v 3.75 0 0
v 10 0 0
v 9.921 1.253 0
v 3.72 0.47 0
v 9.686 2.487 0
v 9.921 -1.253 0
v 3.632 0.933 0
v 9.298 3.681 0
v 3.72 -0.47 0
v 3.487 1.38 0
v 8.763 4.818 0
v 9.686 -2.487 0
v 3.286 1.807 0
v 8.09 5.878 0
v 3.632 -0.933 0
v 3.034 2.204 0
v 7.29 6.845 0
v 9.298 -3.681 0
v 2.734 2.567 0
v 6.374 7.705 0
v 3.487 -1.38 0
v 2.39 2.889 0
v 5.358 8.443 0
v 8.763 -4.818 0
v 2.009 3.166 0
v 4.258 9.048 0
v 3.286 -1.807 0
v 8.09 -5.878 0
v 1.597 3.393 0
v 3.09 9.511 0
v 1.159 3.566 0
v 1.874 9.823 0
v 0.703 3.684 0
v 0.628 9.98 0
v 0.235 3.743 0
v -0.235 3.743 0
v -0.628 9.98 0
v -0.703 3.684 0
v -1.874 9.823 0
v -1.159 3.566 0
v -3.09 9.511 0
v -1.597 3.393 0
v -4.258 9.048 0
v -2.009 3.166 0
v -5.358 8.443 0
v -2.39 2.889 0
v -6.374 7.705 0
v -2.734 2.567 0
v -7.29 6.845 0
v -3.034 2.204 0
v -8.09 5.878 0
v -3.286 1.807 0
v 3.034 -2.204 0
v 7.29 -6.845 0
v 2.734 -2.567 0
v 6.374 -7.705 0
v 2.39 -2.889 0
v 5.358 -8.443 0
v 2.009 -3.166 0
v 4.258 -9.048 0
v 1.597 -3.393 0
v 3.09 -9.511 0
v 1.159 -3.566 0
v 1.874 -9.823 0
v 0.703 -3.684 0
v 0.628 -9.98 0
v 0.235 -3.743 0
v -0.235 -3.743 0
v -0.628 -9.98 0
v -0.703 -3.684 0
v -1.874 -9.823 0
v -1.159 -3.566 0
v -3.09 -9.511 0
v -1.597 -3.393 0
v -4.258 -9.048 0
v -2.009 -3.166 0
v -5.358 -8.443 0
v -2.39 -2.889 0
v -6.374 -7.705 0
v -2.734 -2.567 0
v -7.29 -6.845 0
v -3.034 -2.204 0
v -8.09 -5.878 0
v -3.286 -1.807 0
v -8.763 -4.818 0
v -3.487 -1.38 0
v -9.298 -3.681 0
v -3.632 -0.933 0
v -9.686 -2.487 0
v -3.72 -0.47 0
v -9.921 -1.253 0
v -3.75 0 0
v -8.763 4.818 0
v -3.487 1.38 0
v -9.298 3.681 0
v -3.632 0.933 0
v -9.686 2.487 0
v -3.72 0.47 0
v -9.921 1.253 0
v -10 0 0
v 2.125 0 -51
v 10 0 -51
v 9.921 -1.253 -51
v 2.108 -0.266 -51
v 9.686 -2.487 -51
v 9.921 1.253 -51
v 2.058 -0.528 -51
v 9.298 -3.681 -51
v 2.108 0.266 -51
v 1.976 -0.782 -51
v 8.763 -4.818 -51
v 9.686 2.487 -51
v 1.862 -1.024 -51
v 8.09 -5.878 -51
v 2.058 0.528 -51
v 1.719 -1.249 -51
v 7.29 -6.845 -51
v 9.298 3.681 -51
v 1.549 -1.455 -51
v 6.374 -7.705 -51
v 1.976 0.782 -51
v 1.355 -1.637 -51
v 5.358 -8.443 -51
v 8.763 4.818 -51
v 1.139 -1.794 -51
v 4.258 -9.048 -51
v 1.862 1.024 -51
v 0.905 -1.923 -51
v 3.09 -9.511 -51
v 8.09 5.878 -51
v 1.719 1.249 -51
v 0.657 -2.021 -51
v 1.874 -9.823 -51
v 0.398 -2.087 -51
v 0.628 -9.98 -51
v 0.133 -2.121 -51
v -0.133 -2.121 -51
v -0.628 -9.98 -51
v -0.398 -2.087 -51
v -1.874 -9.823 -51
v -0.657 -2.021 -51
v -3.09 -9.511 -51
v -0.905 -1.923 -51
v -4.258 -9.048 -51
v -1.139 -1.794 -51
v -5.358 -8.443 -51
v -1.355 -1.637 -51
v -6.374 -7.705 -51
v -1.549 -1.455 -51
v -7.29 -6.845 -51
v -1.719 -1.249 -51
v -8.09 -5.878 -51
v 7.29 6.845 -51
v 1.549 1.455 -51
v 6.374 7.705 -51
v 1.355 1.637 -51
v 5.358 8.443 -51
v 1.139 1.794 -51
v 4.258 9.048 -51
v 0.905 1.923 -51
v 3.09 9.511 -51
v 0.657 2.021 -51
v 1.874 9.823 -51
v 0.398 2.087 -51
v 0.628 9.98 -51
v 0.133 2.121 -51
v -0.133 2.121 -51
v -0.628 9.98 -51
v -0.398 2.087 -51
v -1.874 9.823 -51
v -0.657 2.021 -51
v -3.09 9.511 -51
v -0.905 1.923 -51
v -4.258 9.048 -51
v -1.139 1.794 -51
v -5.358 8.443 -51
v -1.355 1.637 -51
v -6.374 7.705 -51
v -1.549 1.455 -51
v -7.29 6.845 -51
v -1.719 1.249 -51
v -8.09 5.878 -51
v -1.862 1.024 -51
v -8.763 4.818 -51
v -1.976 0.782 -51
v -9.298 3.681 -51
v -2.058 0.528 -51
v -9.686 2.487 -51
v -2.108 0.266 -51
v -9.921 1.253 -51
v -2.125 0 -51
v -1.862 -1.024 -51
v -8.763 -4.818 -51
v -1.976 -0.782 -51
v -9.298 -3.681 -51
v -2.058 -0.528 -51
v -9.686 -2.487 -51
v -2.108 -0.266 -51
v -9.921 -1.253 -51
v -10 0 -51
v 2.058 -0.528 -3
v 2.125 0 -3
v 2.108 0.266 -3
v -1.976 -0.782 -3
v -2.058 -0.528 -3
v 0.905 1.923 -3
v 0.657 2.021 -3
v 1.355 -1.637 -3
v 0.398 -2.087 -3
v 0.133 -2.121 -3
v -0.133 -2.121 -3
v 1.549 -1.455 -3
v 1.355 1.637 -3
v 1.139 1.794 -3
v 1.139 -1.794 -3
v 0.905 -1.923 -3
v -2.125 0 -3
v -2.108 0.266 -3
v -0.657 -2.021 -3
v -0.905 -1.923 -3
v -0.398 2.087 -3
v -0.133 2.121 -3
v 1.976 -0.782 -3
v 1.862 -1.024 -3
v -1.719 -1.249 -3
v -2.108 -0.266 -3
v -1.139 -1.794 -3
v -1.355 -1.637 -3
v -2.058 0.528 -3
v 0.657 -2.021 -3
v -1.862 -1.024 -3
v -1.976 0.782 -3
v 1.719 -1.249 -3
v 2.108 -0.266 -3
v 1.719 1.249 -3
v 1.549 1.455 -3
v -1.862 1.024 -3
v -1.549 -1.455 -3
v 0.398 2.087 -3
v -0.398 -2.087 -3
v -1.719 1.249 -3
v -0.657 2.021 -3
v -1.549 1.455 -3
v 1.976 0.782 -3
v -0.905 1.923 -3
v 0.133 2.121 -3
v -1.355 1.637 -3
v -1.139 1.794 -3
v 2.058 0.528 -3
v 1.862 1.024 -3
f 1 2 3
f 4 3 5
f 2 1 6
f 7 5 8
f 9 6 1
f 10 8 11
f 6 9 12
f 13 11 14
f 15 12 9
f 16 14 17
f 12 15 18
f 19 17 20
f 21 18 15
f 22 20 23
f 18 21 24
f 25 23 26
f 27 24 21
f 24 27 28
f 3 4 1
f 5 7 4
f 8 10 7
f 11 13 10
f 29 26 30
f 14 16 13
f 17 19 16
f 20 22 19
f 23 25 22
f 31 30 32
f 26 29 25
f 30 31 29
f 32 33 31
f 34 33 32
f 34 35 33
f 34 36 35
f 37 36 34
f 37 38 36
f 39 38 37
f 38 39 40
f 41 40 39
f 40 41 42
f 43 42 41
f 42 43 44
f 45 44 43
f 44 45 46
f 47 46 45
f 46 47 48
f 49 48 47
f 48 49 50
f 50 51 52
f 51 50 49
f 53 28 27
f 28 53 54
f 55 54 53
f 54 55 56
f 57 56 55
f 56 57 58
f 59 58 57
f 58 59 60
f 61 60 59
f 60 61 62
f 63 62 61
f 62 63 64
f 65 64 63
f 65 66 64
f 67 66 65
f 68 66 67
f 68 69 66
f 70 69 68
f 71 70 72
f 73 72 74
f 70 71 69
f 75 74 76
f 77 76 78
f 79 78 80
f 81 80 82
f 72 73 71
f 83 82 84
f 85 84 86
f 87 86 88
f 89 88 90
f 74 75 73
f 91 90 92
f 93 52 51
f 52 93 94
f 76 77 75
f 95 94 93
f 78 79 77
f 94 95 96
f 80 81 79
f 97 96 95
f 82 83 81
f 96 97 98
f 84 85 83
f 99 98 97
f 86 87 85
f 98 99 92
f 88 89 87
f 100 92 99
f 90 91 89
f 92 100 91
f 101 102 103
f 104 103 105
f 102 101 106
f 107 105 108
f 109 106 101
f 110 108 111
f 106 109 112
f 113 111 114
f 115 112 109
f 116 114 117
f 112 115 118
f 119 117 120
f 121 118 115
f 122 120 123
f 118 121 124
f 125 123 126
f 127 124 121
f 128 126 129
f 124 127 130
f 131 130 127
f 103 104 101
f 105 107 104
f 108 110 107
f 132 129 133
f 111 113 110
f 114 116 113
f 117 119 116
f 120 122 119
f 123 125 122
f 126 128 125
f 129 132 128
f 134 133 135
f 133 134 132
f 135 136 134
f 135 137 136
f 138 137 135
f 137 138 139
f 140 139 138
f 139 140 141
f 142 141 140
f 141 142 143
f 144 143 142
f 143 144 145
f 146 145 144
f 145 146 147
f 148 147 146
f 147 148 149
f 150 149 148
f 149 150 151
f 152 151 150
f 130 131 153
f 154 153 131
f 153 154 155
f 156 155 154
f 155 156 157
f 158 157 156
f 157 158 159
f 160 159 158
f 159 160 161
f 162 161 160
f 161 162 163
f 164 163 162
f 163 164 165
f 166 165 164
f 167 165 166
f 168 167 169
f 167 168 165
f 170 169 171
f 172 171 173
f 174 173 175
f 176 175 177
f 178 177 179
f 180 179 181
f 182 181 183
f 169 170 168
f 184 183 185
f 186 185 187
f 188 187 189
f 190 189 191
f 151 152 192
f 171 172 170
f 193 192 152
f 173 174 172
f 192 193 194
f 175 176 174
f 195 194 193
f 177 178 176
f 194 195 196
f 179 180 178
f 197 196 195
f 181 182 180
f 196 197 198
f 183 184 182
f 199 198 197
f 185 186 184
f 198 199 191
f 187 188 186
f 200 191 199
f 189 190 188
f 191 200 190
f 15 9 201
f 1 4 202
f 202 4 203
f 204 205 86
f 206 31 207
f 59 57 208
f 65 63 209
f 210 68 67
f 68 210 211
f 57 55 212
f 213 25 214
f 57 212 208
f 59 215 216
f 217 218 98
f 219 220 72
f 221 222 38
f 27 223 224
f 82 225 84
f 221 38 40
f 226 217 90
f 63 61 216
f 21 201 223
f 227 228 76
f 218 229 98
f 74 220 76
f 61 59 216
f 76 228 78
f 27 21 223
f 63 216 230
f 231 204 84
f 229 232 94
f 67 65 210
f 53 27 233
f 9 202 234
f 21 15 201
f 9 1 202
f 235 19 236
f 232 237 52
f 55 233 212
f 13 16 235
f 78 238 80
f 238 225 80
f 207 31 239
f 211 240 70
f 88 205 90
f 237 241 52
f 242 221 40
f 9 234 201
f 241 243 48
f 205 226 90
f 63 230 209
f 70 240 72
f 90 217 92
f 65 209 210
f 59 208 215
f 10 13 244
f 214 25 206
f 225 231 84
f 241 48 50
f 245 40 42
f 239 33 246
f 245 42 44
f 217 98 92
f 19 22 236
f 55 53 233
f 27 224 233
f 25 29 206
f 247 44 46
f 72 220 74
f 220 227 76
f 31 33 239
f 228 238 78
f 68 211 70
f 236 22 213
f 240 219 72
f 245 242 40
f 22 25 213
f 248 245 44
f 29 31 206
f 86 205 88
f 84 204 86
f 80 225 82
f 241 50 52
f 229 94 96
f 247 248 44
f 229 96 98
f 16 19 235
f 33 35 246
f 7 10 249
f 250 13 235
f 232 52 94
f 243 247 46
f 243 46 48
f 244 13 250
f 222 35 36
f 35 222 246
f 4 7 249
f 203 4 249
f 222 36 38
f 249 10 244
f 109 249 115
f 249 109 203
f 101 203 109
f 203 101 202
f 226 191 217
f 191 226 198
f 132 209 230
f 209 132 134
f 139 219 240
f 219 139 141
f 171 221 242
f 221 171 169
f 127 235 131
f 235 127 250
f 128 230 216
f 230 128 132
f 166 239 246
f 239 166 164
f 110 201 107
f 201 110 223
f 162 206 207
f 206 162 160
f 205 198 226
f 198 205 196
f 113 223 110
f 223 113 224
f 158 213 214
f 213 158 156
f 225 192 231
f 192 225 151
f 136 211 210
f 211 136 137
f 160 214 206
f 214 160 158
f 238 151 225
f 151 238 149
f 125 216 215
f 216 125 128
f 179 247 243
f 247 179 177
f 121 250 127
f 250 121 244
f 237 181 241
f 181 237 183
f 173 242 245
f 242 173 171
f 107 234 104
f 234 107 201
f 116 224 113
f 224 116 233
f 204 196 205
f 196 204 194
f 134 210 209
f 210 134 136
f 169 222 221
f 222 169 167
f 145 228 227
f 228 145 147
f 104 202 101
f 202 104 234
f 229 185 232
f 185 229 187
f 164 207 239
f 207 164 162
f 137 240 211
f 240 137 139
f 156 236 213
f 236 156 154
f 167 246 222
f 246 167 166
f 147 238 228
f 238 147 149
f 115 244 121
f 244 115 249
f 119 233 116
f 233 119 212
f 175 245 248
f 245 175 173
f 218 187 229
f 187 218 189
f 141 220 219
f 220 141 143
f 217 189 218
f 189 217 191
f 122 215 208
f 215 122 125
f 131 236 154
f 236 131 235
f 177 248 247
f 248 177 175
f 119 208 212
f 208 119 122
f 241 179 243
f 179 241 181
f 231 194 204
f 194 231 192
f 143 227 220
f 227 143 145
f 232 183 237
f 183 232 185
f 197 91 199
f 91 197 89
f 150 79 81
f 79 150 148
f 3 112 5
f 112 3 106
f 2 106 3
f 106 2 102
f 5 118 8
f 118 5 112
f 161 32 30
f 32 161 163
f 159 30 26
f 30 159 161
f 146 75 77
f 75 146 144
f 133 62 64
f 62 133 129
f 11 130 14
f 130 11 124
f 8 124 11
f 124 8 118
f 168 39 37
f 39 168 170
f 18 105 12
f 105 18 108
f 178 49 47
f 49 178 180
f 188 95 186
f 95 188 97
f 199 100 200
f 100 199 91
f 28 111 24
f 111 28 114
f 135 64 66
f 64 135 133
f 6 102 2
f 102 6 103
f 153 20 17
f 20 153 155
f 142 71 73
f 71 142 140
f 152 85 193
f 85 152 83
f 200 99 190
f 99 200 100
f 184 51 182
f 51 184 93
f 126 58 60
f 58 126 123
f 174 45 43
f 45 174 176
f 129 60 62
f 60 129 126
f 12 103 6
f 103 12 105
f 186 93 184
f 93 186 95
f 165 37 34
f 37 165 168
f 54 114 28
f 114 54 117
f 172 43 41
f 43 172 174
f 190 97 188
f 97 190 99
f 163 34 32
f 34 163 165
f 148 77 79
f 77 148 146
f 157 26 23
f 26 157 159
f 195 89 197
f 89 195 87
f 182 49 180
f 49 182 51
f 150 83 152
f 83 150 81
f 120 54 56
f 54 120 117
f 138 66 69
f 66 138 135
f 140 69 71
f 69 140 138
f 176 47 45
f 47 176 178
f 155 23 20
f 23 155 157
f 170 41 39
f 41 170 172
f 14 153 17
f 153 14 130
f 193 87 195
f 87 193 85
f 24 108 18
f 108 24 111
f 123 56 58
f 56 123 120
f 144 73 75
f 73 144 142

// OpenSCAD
$fn = 50;


difference() {
	union() {
		translate(v = [0, 0, -51.0000000000]) {
			cylinder(h = 51, r = 10.0000000000);
		}
		cylinder(h = 0, r = 16.0000000000);
	}
	union() {
		translate(v = [0, 0, 0]) {
			rotate(a = [0, 0, 0]) {
				difference() {
					union() {
						#translate(v = [0, 0, -51.0000000000]) {
							cylinder(h = 51, r = 2.0000000000);
						}
						#translate(v = [0, 0, -3]) {
							cylinder(h = 3, r1 = 2.1250000000, r2 = 3.7500000000);
						}
						#translate(v = [0, 0, -51.0000000000]) {
							cylinder(h = 51, r = 2.1250000000);
						}
						#translate(v = [0, 0, -51.0000000000]) {
							cylinder(h = 51, r = 2.0000000000);
						}
					}
					union();
				}
			}
		}
	}
}
